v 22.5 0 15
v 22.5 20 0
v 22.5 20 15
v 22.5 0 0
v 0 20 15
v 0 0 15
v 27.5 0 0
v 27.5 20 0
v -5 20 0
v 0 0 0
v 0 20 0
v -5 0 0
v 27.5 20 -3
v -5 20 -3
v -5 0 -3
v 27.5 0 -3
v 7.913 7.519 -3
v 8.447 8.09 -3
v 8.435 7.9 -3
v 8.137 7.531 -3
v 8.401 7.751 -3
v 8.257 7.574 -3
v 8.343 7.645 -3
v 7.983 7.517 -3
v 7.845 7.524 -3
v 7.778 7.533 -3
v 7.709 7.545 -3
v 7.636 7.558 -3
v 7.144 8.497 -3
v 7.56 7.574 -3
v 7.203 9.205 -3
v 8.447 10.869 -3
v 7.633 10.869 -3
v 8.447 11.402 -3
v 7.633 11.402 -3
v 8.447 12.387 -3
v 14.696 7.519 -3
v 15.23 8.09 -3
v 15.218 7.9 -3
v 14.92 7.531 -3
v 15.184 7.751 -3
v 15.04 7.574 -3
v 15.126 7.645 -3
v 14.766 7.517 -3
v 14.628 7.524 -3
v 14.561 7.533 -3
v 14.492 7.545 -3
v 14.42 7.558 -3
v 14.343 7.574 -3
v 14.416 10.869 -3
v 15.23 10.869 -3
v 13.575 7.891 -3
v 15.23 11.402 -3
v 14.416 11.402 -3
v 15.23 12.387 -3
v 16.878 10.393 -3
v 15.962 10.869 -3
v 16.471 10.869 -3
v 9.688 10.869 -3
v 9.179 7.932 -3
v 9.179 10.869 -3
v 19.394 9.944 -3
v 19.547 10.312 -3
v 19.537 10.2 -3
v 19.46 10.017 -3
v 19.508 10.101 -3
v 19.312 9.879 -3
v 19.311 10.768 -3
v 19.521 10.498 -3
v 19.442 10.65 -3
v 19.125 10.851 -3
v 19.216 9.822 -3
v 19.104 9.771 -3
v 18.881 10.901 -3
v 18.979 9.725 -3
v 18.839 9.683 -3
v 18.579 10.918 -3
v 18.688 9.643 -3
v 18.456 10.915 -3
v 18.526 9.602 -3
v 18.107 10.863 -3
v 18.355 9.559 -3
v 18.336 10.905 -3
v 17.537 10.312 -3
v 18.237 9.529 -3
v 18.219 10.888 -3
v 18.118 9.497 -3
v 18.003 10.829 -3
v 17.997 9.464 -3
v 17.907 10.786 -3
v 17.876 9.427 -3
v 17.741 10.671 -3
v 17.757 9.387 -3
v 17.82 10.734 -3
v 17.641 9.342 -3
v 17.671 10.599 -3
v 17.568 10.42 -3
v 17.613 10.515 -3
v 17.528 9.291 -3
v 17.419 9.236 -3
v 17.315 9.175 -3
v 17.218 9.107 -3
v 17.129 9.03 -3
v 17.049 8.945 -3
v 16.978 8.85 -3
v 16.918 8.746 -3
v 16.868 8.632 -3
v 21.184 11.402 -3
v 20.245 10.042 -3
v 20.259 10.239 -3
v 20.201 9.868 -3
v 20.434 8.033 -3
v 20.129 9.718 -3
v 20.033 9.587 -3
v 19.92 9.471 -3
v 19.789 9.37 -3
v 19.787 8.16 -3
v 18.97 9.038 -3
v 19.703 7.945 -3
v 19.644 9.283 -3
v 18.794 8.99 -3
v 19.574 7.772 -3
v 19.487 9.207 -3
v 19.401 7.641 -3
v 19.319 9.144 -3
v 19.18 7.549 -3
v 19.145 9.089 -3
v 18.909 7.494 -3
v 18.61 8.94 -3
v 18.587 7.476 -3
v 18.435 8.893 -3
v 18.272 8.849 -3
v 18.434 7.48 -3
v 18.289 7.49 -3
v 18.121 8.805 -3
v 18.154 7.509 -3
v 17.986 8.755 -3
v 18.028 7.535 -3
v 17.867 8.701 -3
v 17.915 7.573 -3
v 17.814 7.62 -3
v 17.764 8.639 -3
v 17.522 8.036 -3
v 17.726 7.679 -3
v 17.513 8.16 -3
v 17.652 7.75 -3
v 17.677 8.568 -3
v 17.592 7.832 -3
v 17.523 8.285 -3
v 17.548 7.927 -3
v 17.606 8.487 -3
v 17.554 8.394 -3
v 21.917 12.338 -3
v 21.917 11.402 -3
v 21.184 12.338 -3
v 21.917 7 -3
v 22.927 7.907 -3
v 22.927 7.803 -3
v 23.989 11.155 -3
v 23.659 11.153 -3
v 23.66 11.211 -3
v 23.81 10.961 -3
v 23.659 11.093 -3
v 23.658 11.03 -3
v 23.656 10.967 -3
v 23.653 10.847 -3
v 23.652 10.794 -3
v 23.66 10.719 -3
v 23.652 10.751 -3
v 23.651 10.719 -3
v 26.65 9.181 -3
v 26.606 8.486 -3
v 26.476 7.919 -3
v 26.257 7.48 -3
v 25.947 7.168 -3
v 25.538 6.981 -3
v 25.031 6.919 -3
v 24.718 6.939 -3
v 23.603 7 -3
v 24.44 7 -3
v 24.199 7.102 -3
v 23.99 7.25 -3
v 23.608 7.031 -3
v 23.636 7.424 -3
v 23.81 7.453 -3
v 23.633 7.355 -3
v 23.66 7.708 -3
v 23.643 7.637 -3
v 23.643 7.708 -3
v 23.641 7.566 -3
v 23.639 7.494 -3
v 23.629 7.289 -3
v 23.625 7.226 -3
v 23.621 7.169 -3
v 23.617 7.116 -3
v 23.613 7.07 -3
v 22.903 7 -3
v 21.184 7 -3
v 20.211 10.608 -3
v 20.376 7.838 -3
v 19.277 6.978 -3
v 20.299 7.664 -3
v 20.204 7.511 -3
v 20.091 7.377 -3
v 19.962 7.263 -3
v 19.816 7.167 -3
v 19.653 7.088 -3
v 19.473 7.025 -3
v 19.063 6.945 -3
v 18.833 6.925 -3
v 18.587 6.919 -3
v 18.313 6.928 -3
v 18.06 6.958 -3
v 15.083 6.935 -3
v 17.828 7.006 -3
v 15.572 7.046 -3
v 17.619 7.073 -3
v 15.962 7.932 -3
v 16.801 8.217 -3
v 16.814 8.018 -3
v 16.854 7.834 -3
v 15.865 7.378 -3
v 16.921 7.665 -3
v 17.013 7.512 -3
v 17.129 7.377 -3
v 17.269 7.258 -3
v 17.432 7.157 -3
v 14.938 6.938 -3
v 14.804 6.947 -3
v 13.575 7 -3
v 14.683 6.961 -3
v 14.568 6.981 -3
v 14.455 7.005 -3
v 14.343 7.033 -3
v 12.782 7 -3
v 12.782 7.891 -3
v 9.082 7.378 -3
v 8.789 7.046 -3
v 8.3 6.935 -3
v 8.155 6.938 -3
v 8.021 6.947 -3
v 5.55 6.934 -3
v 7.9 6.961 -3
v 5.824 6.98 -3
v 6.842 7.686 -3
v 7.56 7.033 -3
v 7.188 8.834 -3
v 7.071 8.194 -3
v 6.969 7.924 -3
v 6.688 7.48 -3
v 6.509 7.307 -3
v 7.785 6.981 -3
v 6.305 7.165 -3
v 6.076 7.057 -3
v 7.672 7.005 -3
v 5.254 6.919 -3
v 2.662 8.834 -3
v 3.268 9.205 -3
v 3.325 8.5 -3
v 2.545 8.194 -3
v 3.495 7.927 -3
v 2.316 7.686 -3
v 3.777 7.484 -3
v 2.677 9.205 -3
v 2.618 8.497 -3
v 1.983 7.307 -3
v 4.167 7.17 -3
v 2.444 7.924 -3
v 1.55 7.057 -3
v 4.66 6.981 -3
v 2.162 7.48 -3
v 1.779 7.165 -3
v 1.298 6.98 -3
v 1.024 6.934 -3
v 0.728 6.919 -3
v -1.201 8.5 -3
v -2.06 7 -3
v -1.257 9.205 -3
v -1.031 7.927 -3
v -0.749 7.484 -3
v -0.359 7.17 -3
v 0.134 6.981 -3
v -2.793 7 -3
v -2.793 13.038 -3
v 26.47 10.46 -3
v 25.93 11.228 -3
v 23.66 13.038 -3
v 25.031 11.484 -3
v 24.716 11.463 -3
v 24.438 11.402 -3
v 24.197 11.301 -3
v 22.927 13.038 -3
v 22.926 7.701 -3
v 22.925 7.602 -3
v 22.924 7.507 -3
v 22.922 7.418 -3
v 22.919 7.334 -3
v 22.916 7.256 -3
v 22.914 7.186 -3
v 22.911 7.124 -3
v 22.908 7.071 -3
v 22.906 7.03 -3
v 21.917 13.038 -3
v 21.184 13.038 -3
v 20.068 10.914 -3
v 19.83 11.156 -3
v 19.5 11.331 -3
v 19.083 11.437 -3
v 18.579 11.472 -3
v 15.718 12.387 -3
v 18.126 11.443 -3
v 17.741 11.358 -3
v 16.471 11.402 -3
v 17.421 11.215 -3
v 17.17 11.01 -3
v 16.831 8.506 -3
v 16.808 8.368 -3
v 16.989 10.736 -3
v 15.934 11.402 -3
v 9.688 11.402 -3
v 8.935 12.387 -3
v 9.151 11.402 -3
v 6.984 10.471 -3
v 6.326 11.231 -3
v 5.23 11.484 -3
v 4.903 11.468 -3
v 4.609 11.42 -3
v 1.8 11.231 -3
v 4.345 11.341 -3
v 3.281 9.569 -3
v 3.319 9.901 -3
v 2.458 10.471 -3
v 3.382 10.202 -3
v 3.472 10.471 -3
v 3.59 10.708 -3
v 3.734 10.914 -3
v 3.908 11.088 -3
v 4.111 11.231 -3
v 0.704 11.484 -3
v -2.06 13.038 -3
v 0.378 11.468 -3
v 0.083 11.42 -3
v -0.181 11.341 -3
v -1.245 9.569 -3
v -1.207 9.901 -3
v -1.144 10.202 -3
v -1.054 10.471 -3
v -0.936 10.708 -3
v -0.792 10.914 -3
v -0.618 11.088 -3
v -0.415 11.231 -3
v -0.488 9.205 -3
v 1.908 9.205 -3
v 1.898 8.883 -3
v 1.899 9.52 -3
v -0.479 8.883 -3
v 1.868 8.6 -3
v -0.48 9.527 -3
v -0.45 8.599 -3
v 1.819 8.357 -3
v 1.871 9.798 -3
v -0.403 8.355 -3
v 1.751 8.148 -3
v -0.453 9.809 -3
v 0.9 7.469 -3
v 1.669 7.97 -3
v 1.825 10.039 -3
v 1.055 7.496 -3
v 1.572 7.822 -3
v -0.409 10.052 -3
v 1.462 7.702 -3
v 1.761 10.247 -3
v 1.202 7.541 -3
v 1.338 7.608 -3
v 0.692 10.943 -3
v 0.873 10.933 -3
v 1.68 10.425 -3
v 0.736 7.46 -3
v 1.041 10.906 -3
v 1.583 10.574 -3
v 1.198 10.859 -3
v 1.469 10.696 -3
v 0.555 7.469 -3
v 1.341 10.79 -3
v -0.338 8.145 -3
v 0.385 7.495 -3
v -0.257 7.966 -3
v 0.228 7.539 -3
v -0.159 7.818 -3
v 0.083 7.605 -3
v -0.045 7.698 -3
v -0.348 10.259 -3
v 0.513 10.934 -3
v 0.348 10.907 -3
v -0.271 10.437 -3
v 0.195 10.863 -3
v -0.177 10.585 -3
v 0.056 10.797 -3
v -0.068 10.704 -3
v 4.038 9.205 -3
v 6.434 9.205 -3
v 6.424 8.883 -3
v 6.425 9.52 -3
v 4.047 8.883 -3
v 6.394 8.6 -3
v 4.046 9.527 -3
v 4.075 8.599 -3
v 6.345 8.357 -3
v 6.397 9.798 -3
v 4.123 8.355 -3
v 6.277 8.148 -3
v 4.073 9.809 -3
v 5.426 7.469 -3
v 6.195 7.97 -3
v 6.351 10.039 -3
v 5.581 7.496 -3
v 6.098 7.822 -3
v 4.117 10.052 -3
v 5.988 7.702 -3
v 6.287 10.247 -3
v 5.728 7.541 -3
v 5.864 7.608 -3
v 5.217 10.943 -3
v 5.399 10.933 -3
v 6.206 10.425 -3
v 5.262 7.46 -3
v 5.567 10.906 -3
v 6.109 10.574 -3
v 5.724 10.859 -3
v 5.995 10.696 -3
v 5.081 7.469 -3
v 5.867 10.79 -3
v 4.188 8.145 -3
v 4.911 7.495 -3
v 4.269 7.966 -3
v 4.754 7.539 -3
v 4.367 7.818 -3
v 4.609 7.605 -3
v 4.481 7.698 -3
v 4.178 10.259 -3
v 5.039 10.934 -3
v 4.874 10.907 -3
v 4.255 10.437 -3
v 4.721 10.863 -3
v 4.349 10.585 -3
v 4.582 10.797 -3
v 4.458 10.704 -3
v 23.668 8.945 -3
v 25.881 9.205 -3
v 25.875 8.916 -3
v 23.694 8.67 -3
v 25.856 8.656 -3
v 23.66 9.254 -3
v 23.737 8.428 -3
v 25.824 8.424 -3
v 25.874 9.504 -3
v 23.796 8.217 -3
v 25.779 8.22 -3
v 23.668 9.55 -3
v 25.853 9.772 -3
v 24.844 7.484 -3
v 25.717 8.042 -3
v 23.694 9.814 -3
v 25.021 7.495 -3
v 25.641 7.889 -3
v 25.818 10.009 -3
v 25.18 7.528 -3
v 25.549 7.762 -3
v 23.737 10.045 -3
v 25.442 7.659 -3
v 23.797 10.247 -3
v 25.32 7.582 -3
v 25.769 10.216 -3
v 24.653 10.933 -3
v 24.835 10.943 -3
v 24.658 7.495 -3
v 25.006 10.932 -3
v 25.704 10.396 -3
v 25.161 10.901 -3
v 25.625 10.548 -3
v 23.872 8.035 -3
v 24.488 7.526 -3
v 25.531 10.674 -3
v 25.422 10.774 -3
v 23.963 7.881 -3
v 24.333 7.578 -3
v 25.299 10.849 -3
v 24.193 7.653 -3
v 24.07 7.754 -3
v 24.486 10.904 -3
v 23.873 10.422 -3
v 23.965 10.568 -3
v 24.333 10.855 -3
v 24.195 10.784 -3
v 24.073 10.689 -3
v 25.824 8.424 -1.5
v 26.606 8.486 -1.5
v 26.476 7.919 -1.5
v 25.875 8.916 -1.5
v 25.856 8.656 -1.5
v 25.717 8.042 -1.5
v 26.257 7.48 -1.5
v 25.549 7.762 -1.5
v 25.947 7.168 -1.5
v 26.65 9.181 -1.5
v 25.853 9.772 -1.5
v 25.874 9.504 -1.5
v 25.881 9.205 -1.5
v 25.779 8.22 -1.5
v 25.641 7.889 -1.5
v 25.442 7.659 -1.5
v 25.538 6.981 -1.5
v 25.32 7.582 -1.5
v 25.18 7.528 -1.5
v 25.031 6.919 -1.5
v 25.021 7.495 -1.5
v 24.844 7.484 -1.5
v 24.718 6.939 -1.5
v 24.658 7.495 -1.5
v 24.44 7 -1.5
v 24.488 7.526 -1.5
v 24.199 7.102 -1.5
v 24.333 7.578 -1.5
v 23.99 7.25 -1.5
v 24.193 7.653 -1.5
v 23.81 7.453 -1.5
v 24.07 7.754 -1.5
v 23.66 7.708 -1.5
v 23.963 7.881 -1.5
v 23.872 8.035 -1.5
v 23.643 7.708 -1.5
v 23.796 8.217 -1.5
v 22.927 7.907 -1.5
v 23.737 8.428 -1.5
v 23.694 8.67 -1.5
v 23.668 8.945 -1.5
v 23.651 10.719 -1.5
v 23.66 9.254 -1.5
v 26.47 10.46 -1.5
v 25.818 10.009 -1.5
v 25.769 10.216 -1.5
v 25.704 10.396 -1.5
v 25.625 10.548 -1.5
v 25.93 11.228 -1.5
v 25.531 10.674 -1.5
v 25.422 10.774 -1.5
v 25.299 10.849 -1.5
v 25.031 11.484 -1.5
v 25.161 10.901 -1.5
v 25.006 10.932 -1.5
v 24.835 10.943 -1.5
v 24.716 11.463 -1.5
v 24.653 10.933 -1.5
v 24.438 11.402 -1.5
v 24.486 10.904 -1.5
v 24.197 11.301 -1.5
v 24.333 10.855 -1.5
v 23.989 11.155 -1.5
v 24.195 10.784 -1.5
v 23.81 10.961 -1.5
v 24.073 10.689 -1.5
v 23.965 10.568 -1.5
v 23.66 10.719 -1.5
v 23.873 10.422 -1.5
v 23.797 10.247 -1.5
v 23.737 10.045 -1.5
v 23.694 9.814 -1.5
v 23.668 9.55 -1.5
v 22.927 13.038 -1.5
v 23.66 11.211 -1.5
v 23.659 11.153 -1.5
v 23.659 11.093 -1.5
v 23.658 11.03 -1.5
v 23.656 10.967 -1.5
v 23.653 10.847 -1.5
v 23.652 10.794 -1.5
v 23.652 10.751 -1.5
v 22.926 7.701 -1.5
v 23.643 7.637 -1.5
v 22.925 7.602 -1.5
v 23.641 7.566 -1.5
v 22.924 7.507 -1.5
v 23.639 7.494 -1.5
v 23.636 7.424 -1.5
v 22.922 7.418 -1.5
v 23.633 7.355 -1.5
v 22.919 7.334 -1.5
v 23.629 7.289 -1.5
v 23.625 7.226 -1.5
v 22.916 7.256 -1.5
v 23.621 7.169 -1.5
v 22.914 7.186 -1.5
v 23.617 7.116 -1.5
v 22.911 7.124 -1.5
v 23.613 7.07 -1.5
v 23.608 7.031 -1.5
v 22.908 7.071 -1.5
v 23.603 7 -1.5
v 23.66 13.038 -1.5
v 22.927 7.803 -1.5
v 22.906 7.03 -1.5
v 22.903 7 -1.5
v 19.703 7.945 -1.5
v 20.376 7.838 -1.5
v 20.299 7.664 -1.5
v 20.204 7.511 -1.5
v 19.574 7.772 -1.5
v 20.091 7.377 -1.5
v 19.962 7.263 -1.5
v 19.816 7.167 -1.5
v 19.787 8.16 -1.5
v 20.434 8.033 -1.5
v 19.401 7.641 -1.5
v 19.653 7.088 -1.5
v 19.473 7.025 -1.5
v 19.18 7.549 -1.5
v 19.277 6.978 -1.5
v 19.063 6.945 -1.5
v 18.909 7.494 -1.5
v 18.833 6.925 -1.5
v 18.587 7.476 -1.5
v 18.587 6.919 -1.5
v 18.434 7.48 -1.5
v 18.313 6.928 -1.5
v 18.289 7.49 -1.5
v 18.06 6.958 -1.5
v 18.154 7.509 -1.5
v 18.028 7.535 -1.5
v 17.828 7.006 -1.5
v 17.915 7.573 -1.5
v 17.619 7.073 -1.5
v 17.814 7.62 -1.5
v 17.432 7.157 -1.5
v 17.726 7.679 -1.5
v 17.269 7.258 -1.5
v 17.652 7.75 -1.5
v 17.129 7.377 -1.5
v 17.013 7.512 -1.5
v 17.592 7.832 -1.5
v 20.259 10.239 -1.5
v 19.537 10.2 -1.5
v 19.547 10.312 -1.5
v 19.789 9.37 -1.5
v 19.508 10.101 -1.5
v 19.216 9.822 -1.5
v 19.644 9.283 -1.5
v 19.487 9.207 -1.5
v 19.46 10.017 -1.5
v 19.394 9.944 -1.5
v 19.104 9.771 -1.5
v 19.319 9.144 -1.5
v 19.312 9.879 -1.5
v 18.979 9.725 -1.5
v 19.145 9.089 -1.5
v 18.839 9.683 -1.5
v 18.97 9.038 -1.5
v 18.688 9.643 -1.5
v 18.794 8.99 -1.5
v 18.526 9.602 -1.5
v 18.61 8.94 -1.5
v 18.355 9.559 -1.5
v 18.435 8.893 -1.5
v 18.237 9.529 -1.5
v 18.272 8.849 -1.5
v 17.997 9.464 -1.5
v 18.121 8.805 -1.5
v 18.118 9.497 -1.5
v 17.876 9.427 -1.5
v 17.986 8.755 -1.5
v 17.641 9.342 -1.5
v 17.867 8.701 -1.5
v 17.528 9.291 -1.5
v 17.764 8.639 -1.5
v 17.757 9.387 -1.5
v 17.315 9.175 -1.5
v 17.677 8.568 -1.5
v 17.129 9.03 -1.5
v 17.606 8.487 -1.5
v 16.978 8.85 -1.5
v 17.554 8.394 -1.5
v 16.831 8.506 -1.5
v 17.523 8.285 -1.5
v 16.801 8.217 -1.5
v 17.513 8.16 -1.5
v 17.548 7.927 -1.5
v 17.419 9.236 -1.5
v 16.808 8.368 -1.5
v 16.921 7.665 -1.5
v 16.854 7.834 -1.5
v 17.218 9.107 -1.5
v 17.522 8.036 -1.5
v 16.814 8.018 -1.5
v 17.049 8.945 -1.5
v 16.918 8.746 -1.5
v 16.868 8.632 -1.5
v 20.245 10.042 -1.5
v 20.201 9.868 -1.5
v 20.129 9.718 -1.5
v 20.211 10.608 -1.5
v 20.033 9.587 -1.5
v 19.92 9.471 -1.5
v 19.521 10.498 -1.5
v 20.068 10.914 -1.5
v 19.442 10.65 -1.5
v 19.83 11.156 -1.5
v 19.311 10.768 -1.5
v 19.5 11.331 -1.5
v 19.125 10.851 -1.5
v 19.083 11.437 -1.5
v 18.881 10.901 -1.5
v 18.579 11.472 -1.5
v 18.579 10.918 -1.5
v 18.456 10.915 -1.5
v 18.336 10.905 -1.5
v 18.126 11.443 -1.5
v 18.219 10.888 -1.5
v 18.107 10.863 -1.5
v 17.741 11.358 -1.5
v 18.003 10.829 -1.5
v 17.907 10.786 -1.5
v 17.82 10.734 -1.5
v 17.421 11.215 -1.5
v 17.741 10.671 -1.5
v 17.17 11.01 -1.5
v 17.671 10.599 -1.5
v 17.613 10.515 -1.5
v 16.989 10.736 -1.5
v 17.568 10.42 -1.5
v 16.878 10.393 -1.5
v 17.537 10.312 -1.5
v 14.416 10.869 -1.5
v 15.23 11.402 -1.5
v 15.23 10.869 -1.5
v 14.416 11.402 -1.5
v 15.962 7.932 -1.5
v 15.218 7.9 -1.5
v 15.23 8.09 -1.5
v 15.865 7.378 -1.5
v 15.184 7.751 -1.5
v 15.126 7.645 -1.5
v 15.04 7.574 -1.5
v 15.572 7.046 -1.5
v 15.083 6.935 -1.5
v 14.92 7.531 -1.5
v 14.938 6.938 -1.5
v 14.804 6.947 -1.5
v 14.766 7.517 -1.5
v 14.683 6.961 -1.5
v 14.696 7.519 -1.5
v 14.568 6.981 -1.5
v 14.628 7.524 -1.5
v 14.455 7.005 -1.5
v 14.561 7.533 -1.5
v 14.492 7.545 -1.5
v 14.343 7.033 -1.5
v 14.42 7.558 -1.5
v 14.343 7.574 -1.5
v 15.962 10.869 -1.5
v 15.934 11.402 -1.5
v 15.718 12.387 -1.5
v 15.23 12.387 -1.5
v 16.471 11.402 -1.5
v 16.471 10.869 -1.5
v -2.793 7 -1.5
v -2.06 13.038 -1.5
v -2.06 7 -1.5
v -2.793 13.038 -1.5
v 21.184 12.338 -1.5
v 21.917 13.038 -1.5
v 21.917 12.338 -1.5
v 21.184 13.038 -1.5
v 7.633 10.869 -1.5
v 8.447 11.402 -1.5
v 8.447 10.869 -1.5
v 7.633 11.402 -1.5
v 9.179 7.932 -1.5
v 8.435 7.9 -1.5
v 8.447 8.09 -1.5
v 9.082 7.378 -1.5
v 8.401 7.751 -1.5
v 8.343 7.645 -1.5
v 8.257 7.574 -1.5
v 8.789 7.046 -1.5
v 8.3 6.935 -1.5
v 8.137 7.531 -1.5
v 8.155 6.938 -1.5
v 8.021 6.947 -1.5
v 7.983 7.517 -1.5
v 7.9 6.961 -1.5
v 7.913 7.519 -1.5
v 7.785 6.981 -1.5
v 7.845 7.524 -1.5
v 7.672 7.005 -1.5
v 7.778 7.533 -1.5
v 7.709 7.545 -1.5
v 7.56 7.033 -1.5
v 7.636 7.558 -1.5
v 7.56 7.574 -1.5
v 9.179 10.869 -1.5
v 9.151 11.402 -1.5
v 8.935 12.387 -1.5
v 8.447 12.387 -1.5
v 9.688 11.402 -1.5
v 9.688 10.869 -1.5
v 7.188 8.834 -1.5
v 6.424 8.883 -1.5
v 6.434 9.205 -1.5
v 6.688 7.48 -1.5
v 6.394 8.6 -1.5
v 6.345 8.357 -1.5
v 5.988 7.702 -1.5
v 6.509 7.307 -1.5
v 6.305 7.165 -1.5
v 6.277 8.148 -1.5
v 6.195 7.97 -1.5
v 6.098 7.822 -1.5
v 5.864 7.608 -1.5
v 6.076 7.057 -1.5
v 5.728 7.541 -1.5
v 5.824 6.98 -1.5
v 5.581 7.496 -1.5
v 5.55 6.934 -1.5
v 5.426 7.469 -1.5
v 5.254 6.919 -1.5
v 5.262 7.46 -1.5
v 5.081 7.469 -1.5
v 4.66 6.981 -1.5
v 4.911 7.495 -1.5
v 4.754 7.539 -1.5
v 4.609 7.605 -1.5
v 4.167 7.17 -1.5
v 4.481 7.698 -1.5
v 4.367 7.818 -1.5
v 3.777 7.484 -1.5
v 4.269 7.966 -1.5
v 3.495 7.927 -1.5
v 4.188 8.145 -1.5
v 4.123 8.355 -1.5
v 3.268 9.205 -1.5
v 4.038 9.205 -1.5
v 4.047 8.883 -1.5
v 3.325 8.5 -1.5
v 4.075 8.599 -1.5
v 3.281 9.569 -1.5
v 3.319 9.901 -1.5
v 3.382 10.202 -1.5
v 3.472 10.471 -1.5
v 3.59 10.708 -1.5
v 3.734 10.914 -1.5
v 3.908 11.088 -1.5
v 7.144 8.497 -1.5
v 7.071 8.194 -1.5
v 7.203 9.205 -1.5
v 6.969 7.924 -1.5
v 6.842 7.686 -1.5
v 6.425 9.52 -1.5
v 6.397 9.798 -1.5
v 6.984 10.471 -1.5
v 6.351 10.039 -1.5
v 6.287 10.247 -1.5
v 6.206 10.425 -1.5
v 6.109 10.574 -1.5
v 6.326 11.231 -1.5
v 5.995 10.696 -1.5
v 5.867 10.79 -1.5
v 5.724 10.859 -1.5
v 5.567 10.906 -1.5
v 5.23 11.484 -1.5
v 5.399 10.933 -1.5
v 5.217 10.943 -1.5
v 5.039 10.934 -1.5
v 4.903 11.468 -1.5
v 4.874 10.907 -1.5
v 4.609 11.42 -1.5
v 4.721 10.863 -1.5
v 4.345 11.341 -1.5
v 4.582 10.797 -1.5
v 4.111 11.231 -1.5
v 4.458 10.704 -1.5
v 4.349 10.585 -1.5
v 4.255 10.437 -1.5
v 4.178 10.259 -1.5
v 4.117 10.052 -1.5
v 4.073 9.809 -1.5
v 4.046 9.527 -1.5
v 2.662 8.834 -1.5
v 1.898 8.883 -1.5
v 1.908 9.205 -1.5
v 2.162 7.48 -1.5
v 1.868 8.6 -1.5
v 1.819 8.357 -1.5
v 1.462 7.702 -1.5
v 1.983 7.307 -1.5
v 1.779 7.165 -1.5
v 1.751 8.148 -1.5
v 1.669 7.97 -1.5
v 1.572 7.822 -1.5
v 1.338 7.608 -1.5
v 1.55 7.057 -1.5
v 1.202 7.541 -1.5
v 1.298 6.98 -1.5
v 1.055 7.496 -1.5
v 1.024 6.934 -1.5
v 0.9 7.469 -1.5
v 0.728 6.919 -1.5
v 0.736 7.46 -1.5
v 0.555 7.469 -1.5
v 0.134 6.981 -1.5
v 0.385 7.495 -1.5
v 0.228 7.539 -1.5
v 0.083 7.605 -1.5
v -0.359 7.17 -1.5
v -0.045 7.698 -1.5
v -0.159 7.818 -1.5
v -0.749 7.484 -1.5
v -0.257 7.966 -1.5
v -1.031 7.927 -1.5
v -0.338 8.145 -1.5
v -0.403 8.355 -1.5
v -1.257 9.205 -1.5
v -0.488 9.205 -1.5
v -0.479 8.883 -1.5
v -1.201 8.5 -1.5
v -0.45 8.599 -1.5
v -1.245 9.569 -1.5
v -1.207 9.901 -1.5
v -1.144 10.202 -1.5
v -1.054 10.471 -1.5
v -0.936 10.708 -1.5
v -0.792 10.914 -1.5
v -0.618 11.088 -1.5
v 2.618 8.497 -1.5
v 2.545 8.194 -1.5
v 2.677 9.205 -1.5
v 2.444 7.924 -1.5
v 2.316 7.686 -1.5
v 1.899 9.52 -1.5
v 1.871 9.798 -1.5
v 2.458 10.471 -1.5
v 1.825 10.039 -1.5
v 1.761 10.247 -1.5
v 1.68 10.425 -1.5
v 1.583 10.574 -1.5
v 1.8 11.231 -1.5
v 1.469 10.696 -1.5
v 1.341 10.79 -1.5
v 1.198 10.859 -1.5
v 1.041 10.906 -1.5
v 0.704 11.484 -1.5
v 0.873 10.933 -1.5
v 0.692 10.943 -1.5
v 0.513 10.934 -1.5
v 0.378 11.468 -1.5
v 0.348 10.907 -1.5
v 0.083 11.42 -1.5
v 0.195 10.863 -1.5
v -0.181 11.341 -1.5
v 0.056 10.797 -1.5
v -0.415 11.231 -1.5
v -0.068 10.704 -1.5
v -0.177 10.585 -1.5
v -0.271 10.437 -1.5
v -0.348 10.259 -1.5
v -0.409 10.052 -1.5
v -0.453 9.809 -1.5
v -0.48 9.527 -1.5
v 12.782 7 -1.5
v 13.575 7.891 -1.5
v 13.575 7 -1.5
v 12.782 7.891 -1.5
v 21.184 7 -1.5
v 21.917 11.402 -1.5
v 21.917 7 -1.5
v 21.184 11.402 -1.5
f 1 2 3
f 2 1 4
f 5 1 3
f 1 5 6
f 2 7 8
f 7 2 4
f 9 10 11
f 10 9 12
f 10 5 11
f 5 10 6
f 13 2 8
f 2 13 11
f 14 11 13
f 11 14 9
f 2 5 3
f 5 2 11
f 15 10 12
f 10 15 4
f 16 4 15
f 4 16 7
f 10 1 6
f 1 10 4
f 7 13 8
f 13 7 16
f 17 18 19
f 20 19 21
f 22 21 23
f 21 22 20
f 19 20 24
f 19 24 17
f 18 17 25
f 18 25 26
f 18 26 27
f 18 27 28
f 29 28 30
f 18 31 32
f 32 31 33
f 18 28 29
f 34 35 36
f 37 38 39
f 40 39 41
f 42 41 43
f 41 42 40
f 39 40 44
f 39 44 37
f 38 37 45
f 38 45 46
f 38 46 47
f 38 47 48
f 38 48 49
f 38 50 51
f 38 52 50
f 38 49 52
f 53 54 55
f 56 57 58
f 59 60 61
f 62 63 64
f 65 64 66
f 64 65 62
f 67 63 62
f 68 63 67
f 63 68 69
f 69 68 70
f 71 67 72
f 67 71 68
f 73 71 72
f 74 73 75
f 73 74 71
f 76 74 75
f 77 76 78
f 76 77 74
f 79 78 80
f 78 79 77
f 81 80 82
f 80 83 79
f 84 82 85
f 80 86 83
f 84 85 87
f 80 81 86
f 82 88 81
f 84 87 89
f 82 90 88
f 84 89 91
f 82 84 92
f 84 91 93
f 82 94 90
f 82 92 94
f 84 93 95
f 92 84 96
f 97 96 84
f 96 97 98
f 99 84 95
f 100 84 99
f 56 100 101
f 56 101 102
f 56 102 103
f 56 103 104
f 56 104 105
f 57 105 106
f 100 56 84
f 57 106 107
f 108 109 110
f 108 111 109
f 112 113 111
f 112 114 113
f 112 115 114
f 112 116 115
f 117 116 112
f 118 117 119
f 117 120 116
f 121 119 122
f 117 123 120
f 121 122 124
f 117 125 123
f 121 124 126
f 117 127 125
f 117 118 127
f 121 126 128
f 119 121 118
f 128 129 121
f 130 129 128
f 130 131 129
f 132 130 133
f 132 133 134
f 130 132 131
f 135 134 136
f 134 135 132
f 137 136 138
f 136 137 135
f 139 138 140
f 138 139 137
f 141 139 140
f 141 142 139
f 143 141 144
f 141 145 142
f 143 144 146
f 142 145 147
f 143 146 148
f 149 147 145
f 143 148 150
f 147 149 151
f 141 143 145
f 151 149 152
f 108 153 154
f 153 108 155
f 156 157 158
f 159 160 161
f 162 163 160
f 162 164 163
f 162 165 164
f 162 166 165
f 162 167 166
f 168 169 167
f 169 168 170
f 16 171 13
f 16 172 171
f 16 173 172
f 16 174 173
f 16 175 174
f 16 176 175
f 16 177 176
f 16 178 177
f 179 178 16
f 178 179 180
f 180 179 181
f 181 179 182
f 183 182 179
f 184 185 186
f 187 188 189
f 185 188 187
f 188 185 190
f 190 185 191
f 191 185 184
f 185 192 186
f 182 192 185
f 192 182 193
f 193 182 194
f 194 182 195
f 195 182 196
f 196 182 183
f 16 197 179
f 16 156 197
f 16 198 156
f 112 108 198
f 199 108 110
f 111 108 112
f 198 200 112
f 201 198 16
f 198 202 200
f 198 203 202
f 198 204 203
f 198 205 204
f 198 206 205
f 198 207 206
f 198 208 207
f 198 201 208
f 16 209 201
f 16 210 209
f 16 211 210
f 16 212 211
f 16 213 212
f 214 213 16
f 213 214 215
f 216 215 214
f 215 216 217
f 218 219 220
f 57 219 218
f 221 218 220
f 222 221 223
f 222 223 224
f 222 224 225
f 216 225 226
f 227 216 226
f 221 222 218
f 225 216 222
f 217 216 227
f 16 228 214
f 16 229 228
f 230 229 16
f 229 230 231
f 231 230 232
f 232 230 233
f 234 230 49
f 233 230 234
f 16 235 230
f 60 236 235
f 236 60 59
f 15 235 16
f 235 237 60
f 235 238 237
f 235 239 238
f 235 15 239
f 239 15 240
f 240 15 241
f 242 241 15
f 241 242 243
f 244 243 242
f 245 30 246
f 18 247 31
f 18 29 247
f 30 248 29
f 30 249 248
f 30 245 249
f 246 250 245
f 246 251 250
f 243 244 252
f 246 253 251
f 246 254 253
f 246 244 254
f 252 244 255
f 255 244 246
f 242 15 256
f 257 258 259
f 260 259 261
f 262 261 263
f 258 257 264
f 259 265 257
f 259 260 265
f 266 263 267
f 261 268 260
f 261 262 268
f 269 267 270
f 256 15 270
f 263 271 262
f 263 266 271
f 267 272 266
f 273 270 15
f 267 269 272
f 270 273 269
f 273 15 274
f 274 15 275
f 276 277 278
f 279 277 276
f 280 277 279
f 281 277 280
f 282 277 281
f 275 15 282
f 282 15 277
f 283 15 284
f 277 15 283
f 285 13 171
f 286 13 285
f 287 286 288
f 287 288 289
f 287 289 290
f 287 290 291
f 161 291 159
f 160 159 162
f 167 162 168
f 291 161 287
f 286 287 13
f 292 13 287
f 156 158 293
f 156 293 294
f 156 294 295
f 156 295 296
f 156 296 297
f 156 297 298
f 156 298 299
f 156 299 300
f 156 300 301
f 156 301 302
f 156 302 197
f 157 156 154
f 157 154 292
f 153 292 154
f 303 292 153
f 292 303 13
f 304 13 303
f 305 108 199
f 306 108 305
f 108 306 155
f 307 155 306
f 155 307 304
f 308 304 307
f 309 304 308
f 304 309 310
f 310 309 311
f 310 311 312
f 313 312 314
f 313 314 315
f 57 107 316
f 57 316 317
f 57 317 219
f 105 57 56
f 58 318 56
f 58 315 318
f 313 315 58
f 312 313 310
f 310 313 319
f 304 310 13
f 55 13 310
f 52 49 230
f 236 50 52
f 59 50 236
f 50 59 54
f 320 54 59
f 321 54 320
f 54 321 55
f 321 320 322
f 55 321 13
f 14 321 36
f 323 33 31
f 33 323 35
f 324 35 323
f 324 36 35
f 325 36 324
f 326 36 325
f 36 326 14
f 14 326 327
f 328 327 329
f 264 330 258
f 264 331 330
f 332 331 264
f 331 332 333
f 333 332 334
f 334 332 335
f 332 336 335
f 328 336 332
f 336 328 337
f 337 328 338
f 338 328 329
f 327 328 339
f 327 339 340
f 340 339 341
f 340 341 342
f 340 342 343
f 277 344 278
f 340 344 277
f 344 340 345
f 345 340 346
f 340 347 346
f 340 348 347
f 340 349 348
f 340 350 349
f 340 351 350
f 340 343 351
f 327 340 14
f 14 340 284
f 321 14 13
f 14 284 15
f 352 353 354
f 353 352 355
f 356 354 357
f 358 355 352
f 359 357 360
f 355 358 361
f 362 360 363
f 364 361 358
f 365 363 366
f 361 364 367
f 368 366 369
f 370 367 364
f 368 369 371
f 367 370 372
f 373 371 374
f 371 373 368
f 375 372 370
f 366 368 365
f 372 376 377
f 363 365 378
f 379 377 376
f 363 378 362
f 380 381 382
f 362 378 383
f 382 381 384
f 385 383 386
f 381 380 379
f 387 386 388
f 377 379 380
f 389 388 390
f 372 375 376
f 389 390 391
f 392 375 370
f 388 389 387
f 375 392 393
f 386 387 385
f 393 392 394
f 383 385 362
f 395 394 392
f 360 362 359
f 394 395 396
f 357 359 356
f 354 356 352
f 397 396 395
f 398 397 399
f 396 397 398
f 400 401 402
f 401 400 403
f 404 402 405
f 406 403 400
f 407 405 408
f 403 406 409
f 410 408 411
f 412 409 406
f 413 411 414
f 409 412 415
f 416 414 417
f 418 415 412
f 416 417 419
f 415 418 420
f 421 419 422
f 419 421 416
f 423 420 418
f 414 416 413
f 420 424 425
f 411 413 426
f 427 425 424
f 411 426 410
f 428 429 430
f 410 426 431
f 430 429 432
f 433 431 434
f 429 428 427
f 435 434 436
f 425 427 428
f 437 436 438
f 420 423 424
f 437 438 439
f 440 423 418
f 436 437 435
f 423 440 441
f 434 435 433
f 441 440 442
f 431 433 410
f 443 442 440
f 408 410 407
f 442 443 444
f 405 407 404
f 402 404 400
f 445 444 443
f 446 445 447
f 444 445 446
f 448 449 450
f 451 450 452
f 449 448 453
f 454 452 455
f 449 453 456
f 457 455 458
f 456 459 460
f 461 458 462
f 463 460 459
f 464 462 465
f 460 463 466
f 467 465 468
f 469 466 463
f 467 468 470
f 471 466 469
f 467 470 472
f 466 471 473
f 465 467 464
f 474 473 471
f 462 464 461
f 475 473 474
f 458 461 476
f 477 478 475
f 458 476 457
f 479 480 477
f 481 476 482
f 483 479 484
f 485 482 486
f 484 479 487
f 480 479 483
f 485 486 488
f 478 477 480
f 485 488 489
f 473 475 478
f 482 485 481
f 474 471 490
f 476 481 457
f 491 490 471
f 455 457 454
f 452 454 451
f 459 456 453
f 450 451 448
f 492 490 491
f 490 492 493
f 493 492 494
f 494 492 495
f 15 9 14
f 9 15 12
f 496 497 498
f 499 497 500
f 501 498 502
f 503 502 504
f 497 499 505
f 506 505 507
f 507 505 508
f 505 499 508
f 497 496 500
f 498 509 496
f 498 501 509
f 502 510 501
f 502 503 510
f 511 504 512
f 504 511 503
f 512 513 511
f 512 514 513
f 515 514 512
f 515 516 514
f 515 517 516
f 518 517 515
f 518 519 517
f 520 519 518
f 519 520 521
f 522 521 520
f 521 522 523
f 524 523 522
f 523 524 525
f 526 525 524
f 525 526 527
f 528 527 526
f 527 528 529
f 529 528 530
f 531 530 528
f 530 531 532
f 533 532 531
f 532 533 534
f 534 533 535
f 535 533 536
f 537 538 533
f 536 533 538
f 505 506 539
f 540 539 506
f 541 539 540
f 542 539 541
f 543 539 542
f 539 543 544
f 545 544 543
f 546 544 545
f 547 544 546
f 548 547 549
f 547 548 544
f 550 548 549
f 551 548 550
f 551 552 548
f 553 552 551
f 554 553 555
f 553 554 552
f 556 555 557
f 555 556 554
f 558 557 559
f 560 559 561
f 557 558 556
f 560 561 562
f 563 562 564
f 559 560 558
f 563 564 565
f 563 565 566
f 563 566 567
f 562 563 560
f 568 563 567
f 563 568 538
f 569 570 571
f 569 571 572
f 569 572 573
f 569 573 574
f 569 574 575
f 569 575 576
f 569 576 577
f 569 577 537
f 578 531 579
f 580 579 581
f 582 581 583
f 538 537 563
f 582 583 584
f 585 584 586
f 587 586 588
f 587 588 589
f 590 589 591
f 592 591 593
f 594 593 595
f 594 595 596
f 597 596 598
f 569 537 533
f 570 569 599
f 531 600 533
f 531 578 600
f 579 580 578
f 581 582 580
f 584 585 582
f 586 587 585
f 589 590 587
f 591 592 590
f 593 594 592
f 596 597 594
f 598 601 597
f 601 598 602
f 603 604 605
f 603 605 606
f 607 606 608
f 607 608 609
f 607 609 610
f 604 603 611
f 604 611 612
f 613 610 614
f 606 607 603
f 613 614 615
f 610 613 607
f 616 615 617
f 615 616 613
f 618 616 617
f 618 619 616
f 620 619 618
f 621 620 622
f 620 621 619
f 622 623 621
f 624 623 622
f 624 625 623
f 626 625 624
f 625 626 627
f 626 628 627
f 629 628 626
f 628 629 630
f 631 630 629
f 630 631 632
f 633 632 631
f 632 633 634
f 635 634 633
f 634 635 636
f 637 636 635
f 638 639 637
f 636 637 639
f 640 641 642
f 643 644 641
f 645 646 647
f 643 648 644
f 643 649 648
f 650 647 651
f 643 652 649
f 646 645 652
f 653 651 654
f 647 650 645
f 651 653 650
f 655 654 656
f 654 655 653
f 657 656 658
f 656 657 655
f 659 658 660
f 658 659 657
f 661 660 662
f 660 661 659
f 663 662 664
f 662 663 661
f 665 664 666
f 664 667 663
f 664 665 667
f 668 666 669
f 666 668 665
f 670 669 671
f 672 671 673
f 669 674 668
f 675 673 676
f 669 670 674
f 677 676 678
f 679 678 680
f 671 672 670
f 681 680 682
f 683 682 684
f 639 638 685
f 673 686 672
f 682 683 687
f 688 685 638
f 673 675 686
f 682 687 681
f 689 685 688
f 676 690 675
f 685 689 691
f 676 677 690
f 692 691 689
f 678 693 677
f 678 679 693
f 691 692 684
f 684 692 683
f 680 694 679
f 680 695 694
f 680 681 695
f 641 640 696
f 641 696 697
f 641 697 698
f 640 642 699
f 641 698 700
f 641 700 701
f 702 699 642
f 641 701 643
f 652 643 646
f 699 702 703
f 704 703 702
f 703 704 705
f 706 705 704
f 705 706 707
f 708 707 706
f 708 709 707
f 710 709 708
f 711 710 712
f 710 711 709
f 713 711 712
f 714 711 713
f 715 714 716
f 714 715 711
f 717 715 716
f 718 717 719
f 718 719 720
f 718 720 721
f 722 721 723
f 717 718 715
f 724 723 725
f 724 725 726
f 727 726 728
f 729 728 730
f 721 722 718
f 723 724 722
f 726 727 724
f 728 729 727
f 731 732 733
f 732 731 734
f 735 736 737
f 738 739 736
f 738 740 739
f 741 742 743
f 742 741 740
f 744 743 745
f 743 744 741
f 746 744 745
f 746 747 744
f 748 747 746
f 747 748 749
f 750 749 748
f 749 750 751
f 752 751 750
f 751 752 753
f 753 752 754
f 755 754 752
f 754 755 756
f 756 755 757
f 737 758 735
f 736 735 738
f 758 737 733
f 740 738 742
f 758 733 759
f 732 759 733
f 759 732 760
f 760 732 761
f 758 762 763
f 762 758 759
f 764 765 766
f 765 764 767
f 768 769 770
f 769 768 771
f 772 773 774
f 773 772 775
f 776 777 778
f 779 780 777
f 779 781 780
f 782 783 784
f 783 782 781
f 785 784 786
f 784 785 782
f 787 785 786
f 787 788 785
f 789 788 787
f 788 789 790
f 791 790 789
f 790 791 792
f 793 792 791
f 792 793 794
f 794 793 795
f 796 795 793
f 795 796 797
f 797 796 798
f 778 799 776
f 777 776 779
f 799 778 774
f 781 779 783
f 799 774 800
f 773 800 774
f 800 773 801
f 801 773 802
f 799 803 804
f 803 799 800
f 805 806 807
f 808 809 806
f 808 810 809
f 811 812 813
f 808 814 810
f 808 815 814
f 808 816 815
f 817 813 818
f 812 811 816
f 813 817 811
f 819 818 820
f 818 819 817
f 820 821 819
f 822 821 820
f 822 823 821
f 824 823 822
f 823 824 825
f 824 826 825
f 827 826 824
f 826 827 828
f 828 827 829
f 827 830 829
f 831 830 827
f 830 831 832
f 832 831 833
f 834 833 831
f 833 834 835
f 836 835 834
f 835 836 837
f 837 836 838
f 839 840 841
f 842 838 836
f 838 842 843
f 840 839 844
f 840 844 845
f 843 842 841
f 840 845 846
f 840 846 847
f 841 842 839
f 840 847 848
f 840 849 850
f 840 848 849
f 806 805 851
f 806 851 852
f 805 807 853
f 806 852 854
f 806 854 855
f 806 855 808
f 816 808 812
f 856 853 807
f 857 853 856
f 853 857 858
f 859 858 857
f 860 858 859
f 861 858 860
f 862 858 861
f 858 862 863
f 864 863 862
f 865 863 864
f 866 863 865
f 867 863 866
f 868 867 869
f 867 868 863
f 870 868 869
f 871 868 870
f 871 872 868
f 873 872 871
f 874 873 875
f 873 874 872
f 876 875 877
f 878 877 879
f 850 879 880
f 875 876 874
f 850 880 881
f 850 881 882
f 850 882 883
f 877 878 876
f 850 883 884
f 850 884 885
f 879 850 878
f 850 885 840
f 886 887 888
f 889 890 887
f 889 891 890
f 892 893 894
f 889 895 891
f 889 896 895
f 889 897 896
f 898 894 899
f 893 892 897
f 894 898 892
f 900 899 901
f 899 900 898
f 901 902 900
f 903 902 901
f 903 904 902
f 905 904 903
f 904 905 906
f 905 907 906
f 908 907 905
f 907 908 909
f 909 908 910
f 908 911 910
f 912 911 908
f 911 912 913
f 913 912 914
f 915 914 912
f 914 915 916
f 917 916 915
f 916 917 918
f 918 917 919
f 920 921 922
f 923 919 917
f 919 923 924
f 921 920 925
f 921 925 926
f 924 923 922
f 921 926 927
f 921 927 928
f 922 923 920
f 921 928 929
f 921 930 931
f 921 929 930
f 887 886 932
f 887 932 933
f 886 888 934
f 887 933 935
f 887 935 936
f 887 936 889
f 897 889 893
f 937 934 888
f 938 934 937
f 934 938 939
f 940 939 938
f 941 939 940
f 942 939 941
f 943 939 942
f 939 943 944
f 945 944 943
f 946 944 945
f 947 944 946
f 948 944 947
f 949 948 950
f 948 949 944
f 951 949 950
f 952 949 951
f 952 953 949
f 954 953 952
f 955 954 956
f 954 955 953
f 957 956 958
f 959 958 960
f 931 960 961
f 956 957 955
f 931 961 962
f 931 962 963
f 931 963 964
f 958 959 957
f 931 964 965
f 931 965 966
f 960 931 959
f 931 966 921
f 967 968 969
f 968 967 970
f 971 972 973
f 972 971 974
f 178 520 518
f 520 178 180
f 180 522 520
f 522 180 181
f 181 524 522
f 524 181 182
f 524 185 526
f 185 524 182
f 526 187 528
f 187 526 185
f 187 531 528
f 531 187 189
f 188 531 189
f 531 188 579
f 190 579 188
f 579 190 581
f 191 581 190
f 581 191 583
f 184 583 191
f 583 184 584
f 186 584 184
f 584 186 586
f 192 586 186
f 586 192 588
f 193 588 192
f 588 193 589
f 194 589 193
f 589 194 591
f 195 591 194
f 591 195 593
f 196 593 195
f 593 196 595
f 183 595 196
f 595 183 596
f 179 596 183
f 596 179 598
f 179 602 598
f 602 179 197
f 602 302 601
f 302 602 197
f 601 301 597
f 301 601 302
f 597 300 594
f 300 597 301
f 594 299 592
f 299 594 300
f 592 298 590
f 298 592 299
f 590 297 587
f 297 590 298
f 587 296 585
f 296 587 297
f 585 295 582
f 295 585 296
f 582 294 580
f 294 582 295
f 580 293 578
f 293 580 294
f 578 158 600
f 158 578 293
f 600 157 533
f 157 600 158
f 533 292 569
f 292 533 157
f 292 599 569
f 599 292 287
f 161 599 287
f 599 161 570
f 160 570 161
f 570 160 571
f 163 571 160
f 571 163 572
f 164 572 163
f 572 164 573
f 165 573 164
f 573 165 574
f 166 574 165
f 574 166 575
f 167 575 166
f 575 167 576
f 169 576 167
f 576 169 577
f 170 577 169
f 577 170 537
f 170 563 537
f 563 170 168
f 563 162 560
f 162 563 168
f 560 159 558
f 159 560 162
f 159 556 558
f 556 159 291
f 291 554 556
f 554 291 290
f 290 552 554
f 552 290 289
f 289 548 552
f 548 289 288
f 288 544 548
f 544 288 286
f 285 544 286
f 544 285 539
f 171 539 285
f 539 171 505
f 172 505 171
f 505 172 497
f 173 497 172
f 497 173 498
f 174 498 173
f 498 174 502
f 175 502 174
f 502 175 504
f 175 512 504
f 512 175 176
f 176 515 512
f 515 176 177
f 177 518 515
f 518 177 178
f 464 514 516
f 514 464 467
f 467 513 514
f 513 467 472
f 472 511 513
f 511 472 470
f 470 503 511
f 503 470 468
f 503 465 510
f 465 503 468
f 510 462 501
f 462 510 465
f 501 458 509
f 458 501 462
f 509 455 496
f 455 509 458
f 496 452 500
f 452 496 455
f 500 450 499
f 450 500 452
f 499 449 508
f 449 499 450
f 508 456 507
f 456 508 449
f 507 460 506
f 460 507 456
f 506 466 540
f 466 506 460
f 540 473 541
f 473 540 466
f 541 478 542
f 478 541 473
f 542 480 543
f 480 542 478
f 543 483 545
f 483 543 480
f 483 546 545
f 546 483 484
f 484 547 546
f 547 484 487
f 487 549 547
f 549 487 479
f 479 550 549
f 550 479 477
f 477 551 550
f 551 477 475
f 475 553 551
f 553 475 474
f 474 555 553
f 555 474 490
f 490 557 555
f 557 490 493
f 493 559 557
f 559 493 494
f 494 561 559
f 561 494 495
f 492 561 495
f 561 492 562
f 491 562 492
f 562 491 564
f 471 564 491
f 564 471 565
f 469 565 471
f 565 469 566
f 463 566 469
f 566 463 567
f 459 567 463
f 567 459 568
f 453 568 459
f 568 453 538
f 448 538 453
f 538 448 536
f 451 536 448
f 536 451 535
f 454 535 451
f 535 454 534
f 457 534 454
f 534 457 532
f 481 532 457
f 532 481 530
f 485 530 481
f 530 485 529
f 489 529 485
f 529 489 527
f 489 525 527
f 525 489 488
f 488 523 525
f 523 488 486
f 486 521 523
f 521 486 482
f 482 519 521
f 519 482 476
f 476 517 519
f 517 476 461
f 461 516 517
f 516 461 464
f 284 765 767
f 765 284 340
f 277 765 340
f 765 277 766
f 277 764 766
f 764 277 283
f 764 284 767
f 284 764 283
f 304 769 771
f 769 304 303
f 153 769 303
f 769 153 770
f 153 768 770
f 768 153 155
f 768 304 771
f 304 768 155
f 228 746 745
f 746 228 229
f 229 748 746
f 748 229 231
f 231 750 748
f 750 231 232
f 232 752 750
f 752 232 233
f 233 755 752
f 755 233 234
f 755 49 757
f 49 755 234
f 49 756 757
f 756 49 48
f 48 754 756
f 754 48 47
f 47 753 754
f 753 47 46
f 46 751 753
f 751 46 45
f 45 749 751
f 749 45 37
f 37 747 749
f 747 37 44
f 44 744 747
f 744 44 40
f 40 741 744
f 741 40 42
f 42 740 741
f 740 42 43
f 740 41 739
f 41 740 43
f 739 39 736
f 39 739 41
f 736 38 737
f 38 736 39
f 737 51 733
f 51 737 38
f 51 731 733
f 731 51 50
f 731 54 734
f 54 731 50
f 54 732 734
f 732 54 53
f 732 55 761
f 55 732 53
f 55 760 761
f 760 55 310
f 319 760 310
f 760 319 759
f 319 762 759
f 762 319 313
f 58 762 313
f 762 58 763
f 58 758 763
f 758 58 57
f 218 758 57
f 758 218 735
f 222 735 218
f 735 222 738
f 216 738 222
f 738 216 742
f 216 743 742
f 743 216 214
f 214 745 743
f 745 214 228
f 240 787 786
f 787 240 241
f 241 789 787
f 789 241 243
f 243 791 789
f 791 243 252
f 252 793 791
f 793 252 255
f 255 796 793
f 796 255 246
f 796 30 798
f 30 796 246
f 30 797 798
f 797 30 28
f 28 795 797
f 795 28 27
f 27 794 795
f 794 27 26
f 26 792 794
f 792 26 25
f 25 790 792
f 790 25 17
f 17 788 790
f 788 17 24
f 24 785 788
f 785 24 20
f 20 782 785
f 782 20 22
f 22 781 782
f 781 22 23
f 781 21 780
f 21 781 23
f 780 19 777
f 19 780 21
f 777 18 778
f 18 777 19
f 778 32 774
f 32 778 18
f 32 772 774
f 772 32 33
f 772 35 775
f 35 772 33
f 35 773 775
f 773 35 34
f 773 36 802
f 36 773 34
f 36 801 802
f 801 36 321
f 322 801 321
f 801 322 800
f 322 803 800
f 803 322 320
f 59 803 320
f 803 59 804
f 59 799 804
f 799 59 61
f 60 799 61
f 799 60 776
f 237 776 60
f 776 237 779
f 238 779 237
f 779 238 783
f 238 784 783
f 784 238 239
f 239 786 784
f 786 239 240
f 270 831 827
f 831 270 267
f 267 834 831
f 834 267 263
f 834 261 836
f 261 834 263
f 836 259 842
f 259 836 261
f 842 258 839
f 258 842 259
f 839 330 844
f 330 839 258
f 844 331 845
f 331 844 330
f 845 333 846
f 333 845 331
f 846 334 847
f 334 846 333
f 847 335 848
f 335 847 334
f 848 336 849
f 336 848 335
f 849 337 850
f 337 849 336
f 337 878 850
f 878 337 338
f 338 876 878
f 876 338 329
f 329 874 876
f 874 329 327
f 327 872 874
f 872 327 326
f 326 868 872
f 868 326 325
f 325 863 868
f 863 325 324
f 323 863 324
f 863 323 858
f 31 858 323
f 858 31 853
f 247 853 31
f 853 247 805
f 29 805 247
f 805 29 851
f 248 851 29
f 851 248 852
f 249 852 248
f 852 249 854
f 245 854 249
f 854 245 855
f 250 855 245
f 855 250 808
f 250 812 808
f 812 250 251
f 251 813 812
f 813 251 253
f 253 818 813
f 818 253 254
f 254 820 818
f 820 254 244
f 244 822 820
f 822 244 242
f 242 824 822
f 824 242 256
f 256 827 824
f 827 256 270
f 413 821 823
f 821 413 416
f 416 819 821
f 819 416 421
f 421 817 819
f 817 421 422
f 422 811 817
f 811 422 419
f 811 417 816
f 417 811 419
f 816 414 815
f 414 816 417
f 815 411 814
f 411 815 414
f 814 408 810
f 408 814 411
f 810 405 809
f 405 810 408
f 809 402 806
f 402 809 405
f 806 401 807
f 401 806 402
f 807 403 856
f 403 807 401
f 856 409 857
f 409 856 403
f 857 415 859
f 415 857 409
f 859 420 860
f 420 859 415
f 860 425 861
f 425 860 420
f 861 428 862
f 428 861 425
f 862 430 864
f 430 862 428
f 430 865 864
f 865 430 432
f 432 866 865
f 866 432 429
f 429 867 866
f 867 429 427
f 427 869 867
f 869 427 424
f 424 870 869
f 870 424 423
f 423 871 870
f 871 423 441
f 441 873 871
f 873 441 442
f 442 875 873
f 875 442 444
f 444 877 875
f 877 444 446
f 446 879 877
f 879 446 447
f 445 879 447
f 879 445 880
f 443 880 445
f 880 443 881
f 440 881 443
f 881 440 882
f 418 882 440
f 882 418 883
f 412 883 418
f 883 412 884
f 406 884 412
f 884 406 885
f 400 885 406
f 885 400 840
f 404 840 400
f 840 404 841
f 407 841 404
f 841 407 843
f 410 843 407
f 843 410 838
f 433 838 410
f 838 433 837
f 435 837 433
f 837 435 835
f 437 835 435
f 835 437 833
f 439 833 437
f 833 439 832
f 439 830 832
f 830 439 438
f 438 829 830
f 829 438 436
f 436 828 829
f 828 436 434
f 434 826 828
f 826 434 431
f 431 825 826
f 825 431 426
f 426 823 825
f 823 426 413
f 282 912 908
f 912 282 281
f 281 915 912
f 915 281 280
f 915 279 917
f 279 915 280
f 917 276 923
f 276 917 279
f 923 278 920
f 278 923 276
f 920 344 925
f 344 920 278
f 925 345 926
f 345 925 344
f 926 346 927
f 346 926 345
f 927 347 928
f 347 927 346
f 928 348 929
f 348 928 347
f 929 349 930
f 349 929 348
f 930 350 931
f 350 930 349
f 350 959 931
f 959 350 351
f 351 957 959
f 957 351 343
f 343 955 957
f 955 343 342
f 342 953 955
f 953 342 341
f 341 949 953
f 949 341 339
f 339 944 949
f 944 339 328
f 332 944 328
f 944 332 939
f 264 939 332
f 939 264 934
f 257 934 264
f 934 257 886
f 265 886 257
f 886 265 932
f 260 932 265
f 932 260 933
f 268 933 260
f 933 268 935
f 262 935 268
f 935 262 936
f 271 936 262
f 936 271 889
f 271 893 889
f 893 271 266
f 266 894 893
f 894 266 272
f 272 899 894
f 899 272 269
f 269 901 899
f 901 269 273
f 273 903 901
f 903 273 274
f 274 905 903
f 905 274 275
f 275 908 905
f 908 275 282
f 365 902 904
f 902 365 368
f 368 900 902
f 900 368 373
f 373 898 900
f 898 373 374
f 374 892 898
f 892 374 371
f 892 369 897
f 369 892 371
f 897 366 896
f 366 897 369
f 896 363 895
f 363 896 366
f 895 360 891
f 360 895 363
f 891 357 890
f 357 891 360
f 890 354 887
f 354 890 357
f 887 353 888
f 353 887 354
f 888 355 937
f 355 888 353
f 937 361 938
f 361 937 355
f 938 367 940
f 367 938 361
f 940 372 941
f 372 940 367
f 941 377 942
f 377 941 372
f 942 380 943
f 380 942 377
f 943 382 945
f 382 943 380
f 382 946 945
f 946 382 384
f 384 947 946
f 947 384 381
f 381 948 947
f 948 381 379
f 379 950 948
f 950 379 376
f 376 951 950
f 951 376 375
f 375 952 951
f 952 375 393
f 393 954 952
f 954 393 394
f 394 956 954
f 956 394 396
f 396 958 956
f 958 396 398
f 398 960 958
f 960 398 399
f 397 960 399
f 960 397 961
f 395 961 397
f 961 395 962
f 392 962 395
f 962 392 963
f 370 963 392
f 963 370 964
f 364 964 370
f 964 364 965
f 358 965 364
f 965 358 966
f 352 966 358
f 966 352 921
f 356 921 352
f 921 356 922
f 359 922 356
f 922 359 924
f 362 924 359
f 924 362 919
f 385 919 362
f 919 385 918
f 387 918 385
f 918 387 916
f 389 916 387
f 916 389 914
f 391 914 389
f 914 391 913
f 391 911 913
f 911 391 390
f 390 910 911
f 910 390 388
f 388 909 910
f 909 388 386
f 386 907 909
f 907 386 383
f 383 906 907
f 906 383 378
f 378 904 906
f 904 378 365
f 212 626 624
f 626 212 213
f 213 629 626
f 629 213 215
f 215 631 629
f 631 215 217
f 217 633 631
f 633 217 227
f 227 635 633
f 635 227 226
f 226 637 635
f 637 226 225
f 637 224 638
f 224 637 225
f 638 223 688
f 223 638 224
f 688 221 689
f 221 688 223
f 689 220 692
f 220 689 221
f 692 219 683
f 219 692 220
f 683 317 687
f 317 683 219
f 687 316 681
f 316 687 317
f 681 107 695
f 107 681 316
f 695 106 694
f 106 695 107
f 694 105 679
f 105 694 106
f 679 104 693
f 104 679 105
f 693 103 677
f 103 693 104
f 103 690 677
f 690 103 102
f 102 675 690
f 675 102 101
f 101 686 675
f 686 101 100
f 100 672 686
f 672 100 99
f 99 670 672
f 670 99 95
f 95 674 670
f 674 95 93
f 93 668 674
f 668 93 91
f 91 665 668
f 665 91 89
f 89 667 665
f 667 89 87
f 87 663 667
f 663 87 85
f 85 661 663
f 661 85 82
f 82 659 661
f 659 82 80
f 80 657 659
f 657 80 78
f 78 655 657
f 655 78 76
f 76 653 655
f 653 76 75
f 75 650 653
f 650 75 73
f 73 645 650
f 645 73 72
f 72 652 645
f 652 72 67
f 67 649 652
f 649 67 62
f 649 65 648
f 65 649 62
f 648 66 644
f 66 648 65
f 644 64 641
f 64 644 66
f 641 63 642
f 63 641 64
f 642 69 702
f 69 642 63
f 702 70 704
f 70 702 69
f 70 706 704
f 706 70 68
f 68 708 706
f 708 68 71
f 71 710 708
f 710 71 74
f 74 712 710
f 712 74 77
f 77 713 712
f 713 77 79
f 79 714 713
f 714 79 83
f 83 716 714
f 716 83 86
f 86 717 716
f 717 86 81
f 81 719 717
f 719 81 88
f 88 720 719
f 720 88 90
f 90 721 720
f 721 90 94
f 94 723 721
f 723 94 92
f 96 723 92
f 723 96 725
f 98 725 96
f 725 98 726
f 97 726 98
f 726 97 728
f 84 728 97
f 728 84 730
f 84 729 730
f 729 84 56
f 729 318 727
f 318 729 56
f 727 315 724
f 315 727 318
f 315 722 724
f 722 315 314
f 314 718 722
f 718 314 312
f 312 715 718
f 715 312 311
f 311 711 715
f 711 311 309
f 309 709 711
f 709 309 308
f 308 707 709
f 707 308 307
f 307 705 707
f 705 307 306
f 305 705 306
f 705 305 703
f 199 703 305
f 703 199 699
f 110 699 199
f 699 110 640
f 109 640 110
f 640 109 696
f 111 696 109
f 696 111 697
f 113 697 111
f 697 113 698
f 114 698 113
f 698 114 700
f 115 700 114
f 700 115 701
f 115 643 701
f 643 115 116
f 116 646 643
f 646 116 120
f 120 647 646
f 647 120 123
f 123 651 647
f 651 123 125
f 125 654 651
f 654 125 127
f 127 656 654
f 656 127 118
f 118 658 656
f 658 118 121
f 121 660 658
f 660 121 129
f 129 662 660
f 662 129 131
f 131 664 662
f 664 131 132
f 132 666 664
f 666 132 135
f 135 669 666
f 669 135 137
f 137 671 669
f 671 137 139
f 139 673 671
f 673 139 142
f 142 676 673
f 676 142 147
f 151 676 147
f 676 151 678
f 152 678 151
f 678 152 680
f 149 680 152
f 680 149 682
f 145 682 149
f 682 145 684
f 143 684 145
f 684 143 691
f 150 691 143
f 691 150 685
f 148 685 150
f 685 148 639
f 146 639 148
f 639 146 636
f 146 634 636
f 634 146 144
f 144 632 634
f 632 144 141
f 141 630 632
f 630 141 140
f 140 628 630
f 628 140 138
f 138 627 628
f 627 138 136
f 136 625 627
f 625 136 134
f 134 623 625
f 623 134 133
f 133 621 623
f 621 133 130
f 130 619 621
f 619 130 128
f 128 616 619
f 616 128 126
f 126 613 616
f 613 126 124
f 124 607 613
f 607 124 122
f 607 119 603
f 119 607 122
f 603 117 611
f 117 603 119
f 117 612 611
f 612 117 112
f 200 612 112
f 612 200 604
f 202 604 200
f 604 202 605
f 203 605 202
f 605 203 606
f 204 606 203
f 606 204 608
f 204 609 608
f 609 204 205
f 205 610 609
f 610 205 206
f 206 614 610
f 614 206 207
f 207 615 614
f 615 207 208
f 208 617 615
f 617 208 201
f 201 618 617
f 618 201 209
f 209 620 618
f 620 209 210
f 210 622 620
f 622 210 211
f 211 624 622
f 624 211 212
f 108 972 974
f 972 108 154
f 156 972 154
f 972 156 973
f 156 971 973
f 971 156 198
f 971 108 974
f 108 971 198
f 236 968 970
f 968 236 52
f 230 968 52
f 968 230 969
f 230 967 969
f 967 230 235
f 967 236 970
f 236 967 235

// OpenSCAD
//distance tool 28.5 mm

difference() {
    union() {
        cube([22.5, 20, 15]);
        translate([-5, 0, -3]) cube([22.5+10, 20, 3]);
    }
    string = str("dist. tool");
    translate ([27, 7, -1.5]) rotate([0, 180, 0])
    linear_extrude(2.0) text(string, size = 6, direction = "ltr", spacing = 1 );
}
